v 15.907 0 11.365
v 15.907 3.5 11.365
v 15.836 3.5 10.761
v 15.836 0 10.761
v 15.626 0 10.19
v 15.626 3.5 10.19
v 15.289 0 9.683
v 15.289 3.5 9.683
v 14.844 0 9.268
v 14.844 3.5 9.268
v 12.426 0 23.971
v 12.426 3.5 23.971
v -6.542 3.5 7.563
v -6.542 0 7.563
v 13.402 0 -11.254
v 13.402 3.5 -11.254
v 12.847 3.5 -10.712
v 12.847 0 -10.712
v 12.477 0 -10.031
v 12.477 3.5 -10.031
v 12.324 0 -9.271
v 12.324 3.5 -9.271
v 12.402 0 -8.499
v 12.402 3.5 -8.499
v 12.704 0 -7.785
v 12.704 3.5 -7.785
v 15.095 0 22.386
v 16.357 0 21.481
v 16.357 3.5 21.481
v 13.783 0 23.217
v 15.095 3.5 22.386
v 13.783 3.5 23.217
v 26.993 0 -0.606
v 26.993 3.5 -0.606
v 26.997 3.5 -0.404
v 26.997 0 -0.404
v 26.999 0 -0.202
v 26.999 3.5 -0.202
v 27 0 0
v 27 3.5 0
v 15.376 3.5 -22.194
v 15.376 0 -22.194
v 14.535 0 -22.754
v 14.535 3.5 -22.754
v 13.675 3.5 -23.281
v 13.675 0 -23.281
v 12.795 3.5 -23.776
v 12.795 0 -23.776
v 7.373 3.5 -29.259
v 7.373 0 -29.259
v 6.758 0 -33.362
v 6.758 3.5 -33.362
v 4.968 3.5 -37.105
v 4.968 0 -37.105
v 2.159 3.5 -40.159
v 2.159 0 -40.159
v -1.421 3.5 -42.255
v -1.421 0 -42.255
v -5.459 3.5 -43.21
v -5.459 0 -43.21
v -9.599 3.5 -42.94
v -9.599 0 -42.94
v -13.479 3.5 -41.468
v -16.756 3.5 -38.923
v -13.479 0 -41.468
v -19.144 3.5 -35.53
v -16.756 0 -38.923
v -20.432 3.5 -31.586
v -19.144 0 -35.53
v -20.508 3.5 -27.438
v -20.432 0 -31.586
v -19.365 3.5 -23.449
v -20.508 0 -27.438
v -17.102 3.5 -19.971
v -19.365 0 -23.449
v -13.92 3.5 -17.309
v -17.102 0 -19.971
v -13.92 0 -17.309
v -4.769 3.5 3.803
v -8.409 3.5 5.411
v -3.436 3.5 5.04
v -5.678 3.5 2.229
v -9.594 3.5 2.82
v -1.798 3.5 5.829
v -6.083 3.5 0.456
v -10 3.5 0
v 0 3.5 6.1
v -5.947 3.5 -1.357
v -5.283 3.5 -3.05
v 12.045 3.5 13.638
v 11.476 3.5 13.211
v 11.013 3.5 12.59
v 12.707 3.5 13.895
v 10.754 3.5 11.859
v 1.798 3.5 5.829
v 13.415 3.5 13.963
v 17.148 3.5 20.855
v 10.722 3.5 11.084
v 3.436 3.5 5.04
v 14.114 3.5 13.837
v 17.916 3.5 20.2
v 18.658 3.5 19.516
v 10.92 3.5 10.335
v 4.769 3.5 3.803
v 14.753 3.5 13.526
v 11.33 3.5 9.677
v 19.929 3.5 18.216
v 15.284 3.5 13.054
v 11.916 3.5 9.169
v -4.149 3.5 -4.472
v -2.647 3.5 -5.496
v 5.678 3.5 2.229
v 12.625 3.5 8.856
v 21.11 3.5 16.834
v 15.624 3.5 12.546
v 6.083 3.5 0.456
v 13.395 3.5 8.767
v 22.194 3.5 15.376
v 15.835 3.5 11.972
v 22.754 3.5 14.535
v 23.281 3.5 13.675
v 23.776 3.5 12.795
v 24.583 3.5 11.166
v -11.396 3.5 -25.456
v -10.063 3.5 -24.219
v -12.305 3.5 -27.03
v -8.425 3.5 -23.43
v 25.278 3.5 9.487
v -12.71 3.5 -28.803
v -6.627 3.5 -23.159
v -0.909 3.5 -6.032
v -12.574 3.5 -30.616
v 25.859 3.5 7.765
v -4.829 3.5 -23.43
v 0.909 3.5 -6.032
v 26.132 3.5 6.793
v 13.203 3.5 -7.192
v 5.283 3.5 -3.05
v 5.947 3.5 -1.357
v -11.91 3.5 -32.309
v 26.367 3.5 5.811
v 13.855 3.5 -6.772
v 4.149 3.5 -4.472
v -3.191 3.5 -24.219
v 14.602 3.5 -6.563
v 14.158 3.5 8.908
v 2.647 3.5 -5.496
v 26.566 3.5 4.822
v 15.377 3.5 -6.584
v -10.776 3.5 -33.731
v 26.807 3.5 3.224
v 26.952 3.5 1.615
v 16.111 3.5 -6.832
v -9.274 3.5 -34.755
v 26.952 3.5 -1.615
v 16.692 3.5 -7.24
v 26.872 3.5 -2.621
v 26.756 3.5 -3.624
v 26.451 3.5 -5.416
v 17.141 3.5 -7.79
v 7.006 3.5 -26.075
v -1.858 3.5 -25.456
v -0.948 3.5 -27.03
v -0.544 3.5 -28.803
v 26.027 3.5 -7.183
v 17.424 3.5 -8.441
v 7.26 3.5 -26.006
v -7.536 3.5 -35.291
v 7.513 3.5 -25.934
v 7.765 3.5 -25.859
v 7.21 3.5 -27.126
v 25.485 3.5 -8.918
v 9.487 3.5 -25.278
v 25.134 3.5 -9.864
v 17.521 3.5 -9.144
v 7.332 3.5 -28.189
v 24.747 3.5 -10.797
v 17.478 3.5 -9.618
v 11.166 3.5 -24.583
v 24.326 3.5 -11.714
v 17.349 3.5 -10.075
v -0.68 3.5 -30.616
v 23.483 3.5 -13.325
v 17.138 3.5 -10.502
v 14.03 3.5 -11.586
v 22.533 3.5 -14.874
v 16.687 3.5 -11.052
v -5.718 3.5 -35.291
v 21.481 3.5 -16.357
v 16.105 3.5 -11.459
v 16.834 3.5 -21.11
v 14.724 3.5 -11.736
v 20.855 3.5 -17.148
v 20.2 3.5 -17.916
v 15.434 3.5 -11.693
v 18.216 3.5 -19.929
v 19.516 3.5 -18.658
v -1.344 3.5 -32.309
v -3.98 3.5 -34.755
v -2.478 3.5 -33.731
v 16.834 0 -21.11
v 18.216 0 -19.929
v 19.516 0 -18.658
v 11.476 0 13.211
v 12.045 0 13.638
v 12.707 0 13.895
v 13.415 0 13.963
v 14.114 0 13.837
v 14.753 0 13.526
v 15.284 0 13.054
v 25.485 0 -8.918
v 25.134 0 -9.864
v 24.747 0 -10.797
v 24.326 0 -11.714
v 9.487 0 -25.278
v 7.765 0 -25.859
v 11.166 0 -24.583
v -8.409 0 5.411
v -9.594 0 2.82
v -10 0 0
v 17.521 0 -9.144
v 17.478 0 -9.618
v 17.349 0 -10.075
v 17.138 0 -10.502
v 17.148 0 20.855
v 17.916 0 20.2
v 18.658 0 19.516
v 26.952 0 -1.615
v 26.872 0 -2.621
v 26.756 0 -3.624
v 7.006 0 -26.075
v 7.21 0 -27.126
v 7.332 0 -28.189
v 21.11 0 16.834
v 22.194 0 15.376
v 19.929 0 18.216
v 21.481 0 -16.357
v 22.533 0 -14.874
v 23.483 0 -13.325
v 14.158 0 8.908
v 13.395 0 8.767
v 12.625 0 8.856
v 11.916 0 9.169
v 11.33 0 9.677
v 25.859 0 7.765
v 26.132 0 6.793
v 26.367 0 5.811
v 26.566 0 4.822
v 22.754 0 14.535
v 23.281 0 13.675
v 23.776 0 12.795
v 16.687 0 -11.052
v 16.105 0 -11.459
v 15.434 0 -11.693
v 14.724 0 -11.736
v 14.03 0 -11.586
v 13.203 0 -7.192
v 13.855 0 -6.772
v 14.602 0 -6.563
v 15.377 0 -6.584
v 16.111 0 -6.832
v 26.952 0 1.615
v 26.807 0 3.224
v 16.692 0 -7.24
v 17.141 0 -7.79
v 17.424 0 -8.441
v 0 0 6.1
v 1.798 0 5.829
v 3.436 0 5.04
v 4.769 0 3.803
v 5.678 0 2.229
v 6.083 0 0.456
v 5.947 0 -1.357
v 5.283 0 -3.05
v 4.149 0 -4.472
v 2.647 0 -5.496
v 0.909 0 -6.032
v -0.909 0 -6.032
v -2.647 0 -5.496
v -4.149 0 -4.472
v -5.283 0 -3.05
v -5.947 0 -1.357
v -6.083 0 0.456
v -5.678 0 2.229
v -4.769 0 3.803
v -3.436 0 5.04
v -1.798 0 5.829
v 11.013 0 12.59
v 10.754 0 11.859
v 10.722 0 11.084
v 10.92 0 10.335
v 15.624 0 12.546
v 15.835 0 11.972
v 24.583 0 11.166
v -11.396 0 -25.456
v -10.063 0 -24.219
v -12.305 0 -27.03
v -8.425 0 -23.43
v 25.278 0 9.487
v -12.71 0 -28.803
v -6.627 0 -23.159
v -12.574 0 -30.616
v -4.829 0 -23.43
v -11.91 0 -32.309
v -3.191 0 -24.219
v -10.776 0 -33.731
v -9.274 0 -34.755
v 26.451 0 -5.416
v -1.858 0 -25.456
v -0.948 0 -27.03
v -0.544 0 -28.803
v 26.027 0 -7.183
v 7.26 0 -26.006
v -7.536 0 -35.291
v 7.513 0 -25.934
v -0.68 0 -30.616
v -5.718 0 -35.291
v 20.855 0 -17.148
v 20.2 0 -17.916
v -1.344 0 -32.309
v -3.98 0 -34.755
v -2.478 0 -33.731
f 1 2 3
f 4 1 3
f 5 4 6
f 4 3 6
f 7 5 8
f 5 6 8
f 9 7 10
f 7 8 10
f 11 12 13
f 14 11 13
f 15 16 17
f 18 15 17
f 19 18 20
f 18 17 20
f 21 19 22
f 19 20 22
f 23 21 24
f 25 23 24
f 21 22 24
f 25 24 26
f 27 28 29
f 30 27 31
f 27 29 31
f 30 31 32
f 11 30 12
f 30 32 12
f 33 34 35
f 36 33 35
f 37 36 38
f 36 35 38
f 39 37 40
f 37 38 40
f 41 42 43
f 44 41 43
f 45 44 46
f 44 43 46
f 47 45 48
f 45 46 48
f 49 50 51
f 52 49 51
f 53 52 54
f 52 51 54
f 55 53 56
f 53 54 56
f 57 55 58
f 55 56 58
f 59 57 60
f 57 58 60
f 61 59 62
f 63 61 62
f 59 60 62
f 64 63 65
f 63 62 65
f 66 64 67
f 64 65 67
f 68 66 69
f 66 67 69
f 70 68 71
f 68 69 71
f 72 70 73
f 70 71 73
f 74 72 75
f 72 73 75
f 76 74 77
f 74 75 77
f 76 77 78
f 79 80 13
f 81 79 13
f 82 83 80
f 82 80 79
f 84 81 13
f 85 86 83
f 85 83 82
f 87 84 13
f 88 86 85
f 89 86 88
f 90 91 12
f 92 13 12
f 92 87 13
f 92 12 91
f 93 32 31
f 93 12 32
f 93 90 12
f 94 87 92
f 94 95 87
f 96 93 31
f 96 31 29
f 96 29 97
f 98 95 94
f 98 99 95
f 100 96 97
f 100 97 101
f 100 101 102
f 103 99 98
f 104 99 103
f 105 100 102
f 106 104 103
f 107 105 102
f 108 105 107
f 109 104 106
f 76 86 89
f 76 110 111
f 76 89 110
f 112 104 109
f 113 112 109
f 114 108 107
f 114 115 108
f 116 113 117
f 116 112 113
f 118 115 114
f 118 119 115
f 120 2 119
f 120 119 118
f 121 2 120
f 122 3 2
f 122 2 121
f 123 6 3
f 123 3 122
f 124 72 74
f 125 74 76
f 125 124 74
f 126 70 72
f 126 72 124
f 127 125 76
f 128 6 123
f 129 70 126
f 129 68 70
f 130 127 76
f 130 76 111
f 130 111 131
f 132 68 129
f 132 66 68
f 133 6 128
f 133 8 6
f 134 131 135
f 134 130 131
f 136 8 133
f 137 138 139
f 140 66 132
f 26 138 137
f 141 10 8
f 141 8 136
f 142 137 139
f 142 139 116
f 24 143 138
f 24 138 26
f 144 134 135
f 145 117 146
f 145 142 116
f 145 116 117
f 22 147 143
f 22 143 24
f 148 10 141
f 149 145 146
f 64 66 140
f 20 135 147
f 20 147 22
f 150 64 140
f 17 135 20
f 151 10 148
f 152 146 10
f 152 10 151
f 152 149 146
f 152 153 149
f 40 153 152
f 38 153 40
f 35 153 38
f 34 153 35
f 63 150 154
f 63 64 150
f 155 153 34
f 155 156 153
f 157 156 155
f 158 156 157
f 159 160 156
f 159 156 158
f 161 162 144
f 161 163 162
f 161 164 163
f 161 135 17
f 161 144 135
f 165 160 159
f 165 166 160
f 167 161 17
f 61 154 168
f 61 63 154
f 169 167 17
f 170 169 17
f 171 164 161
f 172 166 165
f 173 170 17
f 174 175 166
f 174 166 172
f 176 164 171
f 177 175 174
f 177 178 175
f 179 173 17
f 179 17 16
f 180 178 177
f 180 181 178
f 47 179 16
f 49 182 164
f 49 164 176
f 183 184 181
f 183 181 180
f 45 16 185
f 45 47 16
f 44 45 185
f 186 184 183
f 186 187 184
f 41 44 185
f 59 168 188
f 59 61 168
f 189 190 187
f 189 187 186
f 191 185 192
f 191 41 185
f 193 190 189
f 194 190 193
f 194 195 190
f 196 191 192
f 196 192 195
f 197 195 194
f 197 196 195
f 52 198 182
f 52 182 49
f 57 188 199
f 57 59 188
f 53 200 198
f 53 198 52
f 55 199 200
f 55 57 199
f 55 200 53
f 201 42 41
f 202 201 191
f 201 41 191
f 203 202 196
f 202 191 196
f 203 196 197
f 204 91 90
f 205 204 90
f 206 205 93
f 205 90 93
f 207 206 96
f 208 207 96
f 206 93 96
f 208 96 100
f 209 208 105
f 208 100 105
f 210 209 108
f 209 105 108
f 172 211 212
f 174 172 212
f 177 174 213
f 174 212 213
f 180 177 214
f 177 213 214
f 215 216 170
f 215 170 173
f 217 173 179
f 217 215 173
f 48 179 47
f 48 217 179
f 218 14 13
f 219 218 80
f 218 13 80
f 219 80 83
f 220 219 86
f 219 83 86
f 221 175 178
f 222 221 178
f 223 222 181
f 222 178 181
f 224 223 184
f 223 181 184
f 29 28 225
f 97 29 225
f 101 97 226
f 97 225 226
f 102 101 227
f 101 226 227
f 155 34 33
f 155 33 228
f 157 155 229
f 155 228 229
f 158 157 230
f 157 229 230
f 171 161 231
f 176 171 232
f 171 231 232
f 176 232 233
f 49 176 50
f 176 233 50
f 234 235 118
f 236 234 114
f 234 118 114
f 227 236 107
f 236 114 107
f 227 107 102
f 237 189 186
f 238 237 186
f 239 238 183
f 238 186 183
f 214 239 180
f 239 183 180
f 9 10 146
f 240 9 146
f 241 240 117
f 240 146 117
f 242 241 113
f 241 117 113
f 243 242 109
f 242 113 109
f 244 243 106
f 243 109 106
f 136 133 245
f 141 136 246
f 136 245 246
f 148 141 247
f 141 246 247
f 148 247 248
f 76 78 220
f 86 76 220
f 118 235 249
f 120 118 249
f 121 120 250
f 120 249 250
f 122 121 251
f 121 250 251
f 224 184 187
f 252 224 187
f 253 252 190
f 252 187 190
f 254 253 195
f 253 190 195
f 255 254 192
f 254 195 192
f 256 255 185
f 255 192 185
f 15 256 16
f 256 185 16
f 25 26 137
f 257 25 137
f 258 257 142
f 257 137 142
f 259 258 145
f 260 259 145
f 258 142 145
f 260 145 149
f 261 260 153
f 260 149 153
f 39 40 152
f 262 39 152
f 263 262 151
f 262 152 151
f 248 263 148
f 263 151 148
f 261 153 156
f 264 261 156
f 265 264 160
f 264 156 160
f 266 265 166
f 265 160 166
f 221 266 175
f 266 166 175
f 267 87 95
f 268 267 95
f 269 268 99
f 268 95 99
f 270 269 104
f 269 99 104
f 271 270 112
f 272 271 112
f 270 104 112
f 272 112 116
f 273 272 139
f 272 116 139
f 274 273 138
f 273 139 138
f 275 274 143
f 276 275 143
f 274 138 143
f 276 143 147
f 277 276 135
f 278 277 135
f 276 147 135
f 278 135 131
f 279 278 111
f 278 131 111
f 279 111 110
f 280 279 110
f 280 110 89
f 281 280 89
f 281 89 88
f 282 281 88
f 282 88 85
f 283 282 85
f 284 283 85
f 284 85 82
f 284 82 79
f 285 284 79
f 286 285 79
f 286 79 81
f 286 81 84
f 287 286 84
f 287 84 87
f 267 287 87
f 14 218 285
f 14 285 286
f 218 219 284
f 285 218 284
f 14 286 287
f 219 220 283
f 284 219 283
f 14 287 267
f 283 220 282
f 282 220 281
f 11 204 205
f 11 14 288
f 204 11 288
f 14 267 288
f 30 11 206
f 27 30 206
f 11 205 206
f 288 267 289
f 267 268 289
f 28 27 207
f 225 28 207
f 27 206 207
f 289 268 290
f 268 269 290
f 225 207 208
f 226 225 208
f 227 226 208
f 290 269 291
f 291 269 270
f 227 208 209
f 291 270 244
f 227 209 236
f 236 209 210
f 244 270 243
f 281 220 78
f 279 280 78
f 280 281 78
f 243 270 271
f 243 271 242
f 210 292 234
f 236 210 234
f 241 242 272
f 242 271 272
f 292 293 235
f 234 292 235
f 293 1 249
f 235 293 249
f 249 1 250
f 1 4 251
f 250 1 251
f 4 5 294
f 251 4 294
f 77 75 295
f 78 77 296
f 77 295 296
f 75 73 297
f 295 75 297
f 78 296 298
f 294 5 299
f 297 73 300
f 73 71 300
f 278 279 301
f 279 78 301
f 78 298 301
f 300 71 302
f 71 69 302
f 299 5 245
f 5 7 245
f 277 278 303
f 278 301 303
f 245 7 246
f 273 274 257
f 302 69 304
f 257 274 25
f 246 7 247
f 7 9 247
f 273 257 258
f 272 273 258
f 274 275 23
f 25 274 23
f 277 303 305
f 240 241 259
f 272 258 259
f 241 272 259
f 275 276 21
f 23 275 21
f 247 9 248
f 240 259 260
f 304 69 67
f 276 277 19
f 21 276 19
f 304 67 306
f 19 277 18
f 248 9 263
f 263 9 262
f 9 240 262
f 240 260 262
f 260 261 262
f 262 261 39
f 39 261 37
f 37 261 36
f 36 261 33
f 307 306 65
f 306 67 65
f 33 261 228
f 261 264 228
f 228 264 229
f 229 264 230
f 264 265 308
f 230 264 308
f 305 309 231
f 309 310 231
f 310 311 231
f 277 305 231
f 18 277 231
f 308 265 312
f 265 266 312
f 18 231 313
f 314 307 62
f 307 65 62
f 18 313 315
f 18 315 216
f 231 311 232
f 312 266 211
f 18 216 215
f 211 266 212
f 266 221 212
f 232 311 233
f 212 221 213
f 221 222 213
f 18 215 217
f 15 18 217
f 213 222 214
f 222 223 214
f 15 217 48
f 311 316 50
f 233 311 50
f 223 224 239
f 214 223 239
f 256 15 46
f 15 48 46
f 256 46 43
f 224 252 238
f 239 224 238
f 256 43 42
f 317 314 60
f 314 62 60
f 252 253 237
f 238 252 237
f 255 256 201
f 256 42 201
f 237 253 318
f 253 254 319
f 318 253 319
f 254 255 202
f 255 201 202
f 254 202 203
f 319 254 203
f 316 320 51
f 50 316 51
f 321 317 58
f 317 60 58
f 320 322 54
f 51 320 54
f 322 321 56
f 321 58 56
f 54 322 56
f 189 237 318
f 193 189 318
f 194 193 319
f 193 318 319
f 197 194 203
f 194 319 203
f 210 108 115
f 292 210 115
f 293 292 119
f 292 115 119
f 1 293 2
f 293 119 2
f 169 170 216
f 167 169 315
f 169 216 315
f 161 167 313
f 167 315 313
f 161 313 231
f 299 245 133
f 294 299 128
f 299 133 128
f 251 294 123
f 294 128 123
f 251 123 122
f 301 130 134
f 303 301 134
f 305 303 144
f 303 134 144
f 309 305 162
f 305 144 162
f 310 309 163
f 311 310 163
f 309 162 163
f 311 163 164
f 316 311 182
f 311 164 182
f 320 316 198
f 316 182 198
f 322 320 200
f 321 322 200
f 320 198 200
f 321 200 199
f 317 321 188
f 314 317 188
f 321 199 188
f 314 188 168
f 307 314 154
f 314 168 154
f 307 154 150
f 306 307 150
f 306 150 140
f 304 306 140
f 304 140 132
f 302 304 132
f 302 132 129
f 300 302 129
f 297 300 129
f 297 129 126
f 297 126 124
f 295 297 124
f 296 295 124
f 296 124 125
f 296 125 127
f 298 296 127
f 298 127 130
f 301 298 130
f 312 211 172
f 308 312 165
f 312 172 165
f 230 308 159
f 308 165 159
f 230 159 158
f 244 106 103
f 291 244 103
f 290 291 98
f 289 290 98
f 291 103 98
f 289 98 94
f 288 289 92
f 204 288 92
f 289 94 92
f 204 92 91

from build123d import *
from build123d.topology import SkipClean

# Parameters (mm, degrees)
SKETCH_1_R           = 27
EXTRUDE_2_DEPTH      = 10
EXTRUDE_START        = -10
EXTRUDE_3_DEPTH      = 10
CUT_EXTRUDE_2_DEPTH  = 48.669538272
SKETCH_6_R           = 6.1
CUT_EXTRUDE_3_DEPTH  = 10
EXTRUDE_5_DEPTH      = 10
SKETCH_10_R          = 6.1
CUT_EXTRUDE_5_DEPTH  = 10
CUT_EXTRUDE_START    = -10
CUT_EXTRUDE_6_DEPTH  = 10
FILLET_1_R           = 10
EXTRUDE_7_DEPTH      = 10
CUT_EXTRUDE_START_2  = -6.5
CUT_EXTRUDE_8_DEPTH  = 6.5
CUT_EXTRUDE_9_DEPTH  = 10
CUT_EXTRUDE_10_DEPTH = 10
CUT_EXTRUDE_11_DEPTH = 55.495669072


with BuildPart() as part:
    # 草图1 → 凸台-拉伸2 (new body)
    with BuildSketch(Plane(origin=(0, 0, 0), x_dir=(1, 0, 0), z_dir=(0, 1, 0))):
        with Locations(Location((0, 0, 0), (0, 0, 270))):
            Circle(SKETCH_1_R)
    extrude(amount=EXTRUDE_2_DEPTH)

    # 草图3 → 凸台-拉伸3 (add)
    with BuildSketch(Plane(origin=(0, 10, 0), x_dir=(1, 0, 0), z_dir=(0, 1, 0)).offset(EXTRUDE_START)):
        with BuildLine():
            ThreePointArc((-3.623654542, 26.755730746), (-4.775668185, 29.776890365), (-6.810627033, 32.289554959))
            ThreePointArc((-6.810627033, 32.289554959), (-7.703697007, 32.088207373), (-8.590838072, 31.862164101))
            ThreePointArc((-8.590838072, 31.862164101), (-9.263273827, 28.699511571), (-8.918147734, 25.484635391))
            ThreePointArc((-8.918147734, 25.484635391), (-6.303024824, 26.253987851), (-3.623654542, 26.755730746))
        make_face()
        with BuildLine():
            ThreePointArc((-11.714275763, 24.326441239), (-13.743495509, 26.843742988), (-16.455312443, 28.604592156))
            ThreePointArc((-16.455312443, 28.604592156), (-17.242452636, 28.137125424), (-18.016322714, 27.648003832))
            ThreePointArc((-18.016322714, 27.648003832), (-17.678533741, 24.432348458), (-16.356847947, 21.481469346))
            ThreePointArc((-16.356847947, 21.481469346), (-14.107461247, 23.021284438), (-11.714275763, 24.326441239))
        make_face()
        with BuildLine():
            ThreePointArc((-18.658222053, 19.515910171), (-21.366013737, 21.282943016), (-24.48923722, 22.119612574))
            ThreePointArc((-24.48923722, 22.119612574), (-25.093396865, 21.431785595), (-25.678244161, 20.727464312))
            ThreePointArc((-25.678244161, 20.727464312), (-24.363295599, 17.773576848), (-22.194425918, 15.375547411))
            ThreePointArc((-22.194425918, 15.375547411), (-20.530961071, 17.535097305), (-18.658222053, 19.515910171))
        make_face()
        with BuildLine():
            ThreePointArc((-23.77577157, 12.79502584), (-26.897077674, 13.638820294), (-30.125984831, 13.469411196))
            ThreePointArc((-30.125984831, 13.469411196), (-30.488024573, 12.628553268), (-30.826600159, 11.777976169))
            ThreePointArc((-30.826600159, 11.777976169), (-28.663208335, 9.3750037), (-25.859458842, 7.764559768))
            ThreePointArc((-25.859458842, 7.764559768), (-24.944747378, 10.332452674), (-23.77577157, 12.79502584))
        make_face()
        with BuildLine():
            ThreePointArc((-26.56598291, 4.821675232), (-29.795268245, 4.659634815), (-32.813791147, 3.500730003))
            ThreePointArc((-32.813791147, 3.500730003), (-32.898272013, 2.589150159), (-32.957433752, 1.675577656))
            ThreePointArc((-32.957433752, 1.675577656), (-30.15736653, 0.05873987), (-26.993187762, -0.606477084))
            ThreePointArc((-26.993187762, -0.606477084), (-26.916768011, 2.118395585), (-26.56598291, 4.821675232))
        make_face()
        with BuildLine():
            ThreePointArc((-32.289554959, -6.810627033), (-32.088207373, -7.703697007), (-31.862164101, -8.590838072))
            ThreePointArc((-31.862164101, -8.590838072), (-28.699511571, -9.263273827), (-25.484635391, -8.918147734))
            ThreePointArc((-25.484635391, -8.918147734), (-26.253987851, -6.303024824), (-26.755730746, -3.623654542))
            ThreePointArc((-26.755730746, -3.623654542), (-29.776890365, -4.775668185), (-32.289554959, -6.810627033))
        make_face()
        with BuildLine():
            ThreePointArc((-28.604592156, -16.455312443), (-28.137125424, -17.242452636), (-27.648003832, -18.016322714))
            ThreePointArc((-27.648003832, -18.016322714), (-24.432348458, -17.678533741), (-21.481469346, -16.356847947))
            ThreePointArc((-21.481469346, -16.356847947), (-23.021284438, -14.107461247), (-24.326441239, -11.714275763))
            ThreePointArc((-24.326441239, -11.714275763), (-26.843742988, -13.743495509), (-28.604592156, -16.455312443))
        make_face()
        with BuildLine():
            ThreePointArc((-22.119612574, -24.48923722), (-21.431785595, -25.093396865), (-20.727464312, -25.678244161))
            ThreePointArc((-20.727464312, -25.678244161), (-17.773576848, -24.363295599), (-15.375547411, -22.194425918))
            ThreePointArc((-15.375547411, -22.194425918), (-17.535097305, -20.530961071), (-19.515910171, -18.658222053))
            ThreePointArc((-19.515910171, -18.658222053), (-21.282943016, -21.366013737), (-22.119612574, -24.48923722))
        make_face()
        with BuildLine():
            ThreePointArc((-13.469411196, -30.125984831), (-12.628553268, -30.488024573), (-11.777976169, -30.826600159))
            ThreePointArc((-11.777976169, -30.826600159), (-9.3750037, -28.663208335), (-7.764559768, -25.859458842))
            ThreePointArc((-7.764559768, -25.859458842), (-10.332452674, -24.944747378), (-12.79502584, -23.77577157))
            ThreePointArc((-12.79502584, -23.77577157), (-13.638820294, -26.897077674), (-13.469411196, -30.125984831))
        make_face()
        with BuildLine():
            ThreePointArc((-3.500730003, -32.813791147), (-2.589150159, -32.898272013), (-1.675577656, -32.957433752))
            ThreePointArc((-1.675577656, -32.957433752), (-0.05873987, -30.15736653), (0.606477084, -26.993187762))
            ThreePointArc((0.606477084, -26.993187762), (-2.118395585, -26.916768011), (-4.821675232, -26.56598291))
            ThreePointArc((-4.821675232, -26.56598291), (-4.659634815, -29.795268245), (-3.500730003, -32.813791147))
        make_face()
        with BuildLine():
            ThreePointArc((6.810627033, -32.289554959), (7.703697007, -32.088207373), (8.590838072, -31.862164101))
            ThreePointArc((8.590838072, -31.862164101), (9.263273827, -28.699511571), (8.918147734, -25.484635391))
            ThreePointArc((8.918147734, -25.484635391), (6.303024824, -26.253987851), (3.623654542, -26.755730746))
            ThreePointArc((3.623654542, -26.755730746), (4.775668185, -29.776890365), (6.810627033, -32.289554959))
        make_face()
        with BuildLine():
            ThreePointArc((16.455312443, -28.604592156), (17.242452636, -28.137125424), (18.016322714, -27.648003832))
            ThreePointArc((18.016322714, -27.648003832), (17.678533741, -24.432348458), (16.356847947, -21.481469346))
            ThreePointArc((16.356847947, -21.481469346), (14.107461247, -23.021284438), (11.714275763, -24.326441239))
            ThreePointArc((11.714275763, -24.326441239), (13.743495509, -26.843742988), (16.455312443, -28.604592156))
        make_face()
        with BuildLine():
            ThreePointArc((24.48923722, -22.119612574), (25.093396865, -21.431785595), (25.678244161, -20.727464312))
            ThreePointArc((25.678244161, -20.727464312), (24.363295599, -17.773576848), (22.194425918, -15.375547411))
            ThreePointArc((22.194425918, -15.375547411), (20.530961071, -17.535097305), (18.658222053, -19.515910171))
            ThreePointArc((18.658222053, -19.515910171), (21.366013737, -21.282943016), (24.48923722, -22.119612574))
        make_face()
        with BuildLine():
            ThreePointArc((30.125984831, -13.469411196), (30.488024573, -12.628553268), (30.826600159, -11.777976169))
            ThreePointArc((30.826600159, -11.777976169), (28.663208335, -9.3750037), (25.859458842, -7.764559768))
            ThreePointArc((25.859458842, -7.764559768), (24.944747378, -10.332452674), (23.77577157, -12.79502584))
            ThreePointArc((23.77577157, -12.79502584), (26.897077674, -13.638820294), (30.125984831, -13.469411196))
        make_face()
        with BuildLine():
            ThreePointArc((32.813791147, -3.500730003), (32.898272013, -2.589150159), (32.957433752, -1.675577656))
            ThreePointArc((32.957433752, -1.675577656), (30.15736653, -0.05873987), (26.993187762, 0.606477084))
            ThreePointArc((26.993187762, 0.606477084), (26.998296887, 0.303257671), (27, 0))
            ThreePointArc((27, 0), (26.891276825, -2.420584789), (26.56598291, -4.821675232))
            ThreePointArc((26.56598291, -4.821675232), (29.795268245, -4.659634815), (32.813791147, -3.500730003))
        make_face()
        with BuildLine():
            ThreePointArc((26.755730746, 3.623654542), (29.776890365, 4.775668185), (32.289554959, 6.810627033))
            ThreePointArc((32.289554959, 6.810627033), (32.088207373, 7.703697007), (31.862164101, 8.590838072))
            ThreePointArc((31.862164101, 8.590838072), (28.699511571, 9.263273827), (25.484635391, 8.918147734))
            ThreePointArc((25.484635391, 8.918147734), (26.253987851, 6.303024824), (26.755730746, 3.623654542))
        make_face()
        with BuildLine():
            ThreePointArc((24.326441239, 11.714275763), (26.843742988, 13.743495509), (28.604592156, 16.455312443))
            ThreePointArc((28.604592156, 16.455312443), (28.137125424, 17.242452636), (27.648003832, 18.016322714))
            ThreePointArc((27.648003832, 18.016322714), (24.432348458, 17.678533741), (21.481469346, 16.356847947))
            ThreePointArc((21.481469346, 16.356847947), (23.021284438, 14.107461247), (24.326441239, 11.714275763))
        make_face()
        with BuildLine():
            ThreePointArc((19.515910171, 18.658222053), (21.282943016, 21.366013737), (22.119612574, 24.48923722))
            ThreePointArc((22.119612574, 24.48923722), (21.431785595, 25.093396865), (20.727464312, 25.678244161))
            ThreePointArc((20.727464312, 25.678244161), (17.773576848, 24.363295599), (15.375547411, 22.194425918))
            ThreePointArc((15.375547411, 22.194425918), (17.535097305, 20.530961071), (19.515910171, 18.658222053))
        make_face()
        with BuildLine():
            ThreePointArc((12.79502584, 23.77577157), (13.638820294, 26.897077674), (13.469411196, 30.125984831))
            ThreePointArc((13.469411196, 30.125984831), (12.628553268, 30.488024573), (11.777976169, 30.826600159))
            ThreePointArc((11.777976169, 30.826600159), (9.3750037, 28.663208335), (7.764559768, 25.859458842))
            ThreePointArc((7.764559768, 25.859458842), (10.332452674, 24.944747378), (12.79502584, 23.77577157))
        make_face()
        with BuildLine():
            ThreePointArc((4.821675232, 26.56598291), (4.659634815, 29.795268245), (3.500730003, 32.813791147))
            ThreePointArc((3.500730003, 32.813791147), (2.589150159, 32.898272013), (1.675577656, 32.957433752))
            ThreePointArc((1.675577656, 32.957433752), (0.05873987, 30.15736653), (-0.606477084, 26.993187762))
            ThreePointArc((-0.606477084, 26.993187762), (2.118395585, 26.916768011), (4.821675232, 26.56598291))
        make_face()
    extrude(amount=EXTRUDE_3_DEPTH)

    # 草图4 → 切除-拉伸2 (cut, through all)
    with BuildSketch(Plane(origin=(0, 10, 0), x_dir=(1, 0, 0), z_dir=(0, 1, 0))):
        with BuildLine():
            Line((68.70942434, -72.656830422), (-6.542169106, -7.563069707))
            ThreePointArc((-6.542169106, -7.563069707), (-9.614988938, -2.748088014), (-9.550796477, 2.963492306))
            Line((-9.550796477, 2.963492306), (-2.118395585, 26.916768011))
            Line((-2.118395585, 26.916768011), (19.935579671, 97.992717399))
            ThreePointArc((19.935579671, 97.992717399), (-96.149889375, -27.480880138), (68.70942434, -72.656830422))
        make_face()
    extrude(amount=-CUT_EXTRUDE_2_DEPTH, mode=Mode.SUBTRACT)

    # 草图6 → 切除-拉伸3 (cut)
    with BuildSketch(Plane(origin=(0, 10, 0), x_dir=(1, 0, 0), z_dir=(0, 1, 0))):
        with Locations(Location((0, 0, 0), (0, 0, 270))):
            Circle(SKETCH_6_R)
    extrude(amount=-CUT_EXTRUDE_3_DEPTH, mode=Mode.SUBTRACT)

    # 草图9 → 凸台-拉伸5 (add)
    with BuildSketch(Plane(origin=(0, 10, 0), x_dir=(1, 0, 0), z_dir=(0, 1, 0)).offset(EXTRUDE_START)):
        with BuildLine():
            Line((-18.337271569, 36.810995995), (-10, 0))
            ThreePointArc((-10, 0), (-9.887061363, 1.49867195), (-9.550796477, 2.963492306))
            Line((-9.550796477, 2.963492306), (-2.118395585, 26.916768011))
            ThreePointArc((-2.118395585, 26.916768011), (-1.362972032, 26.965576338), (-0.606477084, 26.993187762))
            ThreePointArc((-0.606477084, 26.993187762), (0.05873987, 30.15736653), (1.675577656, 32.957433752))
            ThreePointArc((1.675577656, 32.957433752), (2.589150159, 32.898272013), (3.500730003, 32.813791147))
            ThreePointArc((3.500730003, 32.813791147), (4.659634815, 29.795268245), (4.821675232, 26.56598291))
            Line((4.821675232, 26.56598291), (7.168022985, 33.612773021))
            ThreePointArc((7.168022985, 33.612773021), (-5.303969741, 37.450057719), (-18.337271569, 36.810995995))
        make_face()
    extrude(amount=EXTRUDE_5_DEPTH)

    # 草图10 → 切除-拉伸5 (cut)
    with BuildSketch(Plane(origin=(0, 10, 0), x_dir=(1, 0, 0), z_dir=(0, 1, 0))):
        with Locations(Location((-6.626815852, 29.258935587, 0), (0, 0, 270))):
            Circle(SKETCH_10_R)
    extrude(amount=-CUT_EXTRUDE_5_DEPTH, mode=Mode.SUBTRACT)

    # 草图11 → 切除-拉伸6 (cut)
    with BuildSketch(Plane(origin=(0, 10, 0), x_dir=(1, 0, 0), z_dir=(0, 1, 0)).offset(CUT_EXTRUDE_START)):
        with BuildLine():
            Line((0, 36.394498532), (3.500730003, 32.813791147))
            ThreePointArc((3.500730003, 32.813791147), (4.659634815, 29.795268245), (4.821675232, 26.56598291))
            Line((4.821675232, 26.56598291), (7.168022985, 33.612773021))
            ThreePointArc((7.168022985, 33.612773021), (3.655030847, 35.186640305), (0, 36.394498532))
        make_face()
    extrude(amount=CUT_EXTRUDE_6_DEPTH, mode=Mode.SUBTRACT)

    # 圆角1
    fillet_1_edges = [part.edges().sort_by_distance(p)[0] for p in [
        (-18.337271569, 5, -36.810995995),
    ]]
    fillet(fillet_1_edges, radius=FILLET_1_R)

    # 草图16 → 凸台-拉伸7 (add)
    with BuildSketch(Plane(origin=(0, 10, 0), x_dir=(1, 0, 0), z_dir=(0, 1, 0)).offset(EXTRUDE_START)):
        with BuildLine():
            Line((-13.920244702, 17.308793512), (-15.716384779, 25.239170332))
            ThreePointArc((-15.716384779, 25.239170332), (-13.300434171, 34.242814336), (-4.508428545, 37.341694744))
            ThreePointArc((-4.508428545, 37.341694744), (-2.23974925, 36.936946702), (0, 36.394498532))
            Line((0, 36.394498532), (3.500730003, 32.813791147))
            ThreePointArc((3.500730003, 32.813791147), (4.659634815, 29.795268245), (4.821675232, 26.56598291))
            ThreePointArc((4.821675232, 26.56598291), (5.919103569, 26.343200507), (7.006350229, 26.075104151))
            ThreePointArc((7.006350229, 26.075104151), (7.281173311, 27.65648826), (7.373184148, 29.258935587))
            ThreePointArc((7.373184148, 29.258935587), (-13.478530824, 41.467703008), (-13.920244702, 17.308793512))
        make_face()
    extrude(amount=EXTRUDE_7_DEPTH)

    # 草图17 → 切除-拉伸8 (cut)
    with BuildSketch(Plane(origin=(0, 10, 0), x_dir=(1, 0, 0), z_dir=(0, 1, 0)).offset(CUT_EXTRUDE_START_2)):
        with BuildLine():
            Line((-13.920244702, 17.308793512), (-10, 0))
            ThreePointArc((-10, 0), (-9.09455032, -4.158022904), (-6.542169106, -7.563069707))
            Line((-6.542169106, -7.563069707), (17.242452636, -28.137125424))
            ThreePointArc((17.242452636, -28.137125424), (17.631083908, -27.895248345), (18.016322714, -27.648003832))
            ThreePointArc((18.016322714, -27.648003832), (17.678533741, -24.432348458), (16.356847947, -21.481469346))
            ThreePointArc((16.356847947, -21.481469346), (17.535097305, -20.530961071), (18.658222053, -19.515910171))
            ThreePointArc((18.658222053, -19.515910171), (21.366013737, -21.282943016), (24.48923722, -22.119612574))
            ThreePointArc((24.48923722, -22.119612574), (25.093396865, -21.431785595), (25.678244161, -20.727464312))
            ThreePointArc((25.678244161, -20.727464312), (24.363295599, -17.773576848), (22.194425918, -15.375547411))
            ThreePointArc((22.194425918, -15.375547411), (23.021284438, -14.107461247), (23.77577157, -12.79502584))
            ThreePointArc((23.77577157, -12.79502584), (26.897077674, -13.638820294), (30.125984831, -13.469411196))
            ThreePointArc((30.125984831, -13.469411196), (30.488024573, -12.628553268), (30.826600159, -11.777976169))
            ThreePointArc((30.826600159, -11.777976169), (28.663208335, -9.3750037), (25.859458842, -7.764559768))
            ThreePointArc((25.859458842, -7.764559768), (26.253987851, -6.303024824), (26.56598291, -4.821675232))
            ThreePointArc((26.56598291, -4.821675232), (29.795268245, -4.659634815), (32.813791147, -3.500730003))
            ThreePointArc((32.813791147, -3.500730003), (32.898272013, -2.589150159), (32.957433752, -1.675577656))
            ThreePointArc((32.957433752, -1.675577656), (30.15736653, -0.05873987), (26.993187762, 0.606477084))
            ThreePointArc((26.993187762, 0.606477084), (26.916768011, 2.118395585), (26.755730746, 3.623654542))
            ThreePointArc((26.755730746, 3.623654542), (29.776890365, 4.775668185), (32.289554959, 6.810627033))
            ThreePointArc((32.289554959, 6.810627033), (32.088207373, 7.703697007), (31.862164101, 8.590838072))
            ThreePointArc((31.862164101, 8.590838072), (28.699511571, 9.263273827), (25.484635391, 8.918147734))
            ThreePointArc((25.484635391, 8.918147734), (24.944747378, 10.332452674), (24.326441239, 11.714275763))
            ThreePointArc((24.326441239, 11.714275763), (26.843742988, 13.743495509), (28.604592156, 16.455312443))
            ThreePointArc((28.604592156, 16.455312443), (28.137125424, 17.242452636), (27.648003832, 18.016322714))
            ThreePointArc((27.648003832, 18.016322714), (24.432348458, 17.678533741), (21.481469346, 16.356847947))
            ThreePointArc((21.481469346, 16.356847947), (20.530961071, 17.535097305), (19.515910171, 18.658222053))
            ThreePointArc((19.515910171, 18.658222053), (21.282943016, 21.366013737), (22.119612574, 24.48923722))
            ThreePointArc((22.119612574, 24.48923722), (21.431785595, 25.093396865), (20.727464312, 25.678244161))
            ThreePointArc((20.727464312, 25.678244161), (17.773576848, 24.363295599), (15.375547411, 22.194425918))
            ThreePointArc((15.375547411, 22.194425918), (14.107461247, 23.021284438), (12.79502584, 23.77577157))
            ThreePointArc((12.79502584, 23.77577157), (13.638820294, 26.897077674), (13.469411196, 30.125984831))
            ThreePointArc((13.469411196, 30.125984831), (12.628553268, 30.488024573), (11.777976169, 30.826600159))
            ThreePointArc((11.777976169, 30.826600159), (9.3750037, 28.663208335), (7.764559768, 25.859458842))
            ThreePointArc((7.764559768, 25.859458842), (7.386242025, 25.970048686), (7.006350229, 26.075104151))
            ThreePointArc((7.006350229, 26.075104151), (-12.036078056, 42.171715396), (-13.920244702, 17.308793512))
        make_face()
    extrude(amount=CUT_EXTRUDE_8_DEPTH, mode=Mode.SUBTRACT)

    # 草图19 → 切除-拉伸9 (cut)
    with BuildSketch(Plane(origin=(0, 3.5, 0), x_dir=(1, 0, 0), z_dir=(0, 1, 0))):
        with BuildLine():
            ThreePointArc((17.521202876, 9.143724883), (17.423586491, 9.849470052), (17.138067304, 10.502221151))
            Line((17.138067304, 10.502221151), (14.921202876, 9.143724883))
            ThreePointArc((14.921202876, 9.143724883), (15.559223715, 8.01002855), (16.111264261, 6.832068788))
            ThreePointArc((16.111264261, 6.832068788), (17.140905514, 7.78987105), (17.521202876, 9.143724883))
        make_face()
        with BuildLine():
            Line((14.921202876, 9.143724883), (17.138067304, 10.502221151))
            ThreePointArc((17.138067304, 10.502221151), (15.433773338, 11.692699485), (13.401778777, 11.253547246))
            ThreePointArc((13.401778777, 11.253547246), (14.200727447, 10.226892977), (14.921202876, 9.143724883))
        make_face()
        with BuildLine():
            ThreePointArc((16.111264261, 6.832068788), (15.559223715, 8.01002855), (14.921202876, 9.143724883))
            Line((14.921202876, 9.143724883), (12.704338449, 7.785228614))
            ThreePointArc((12.704338449, 7.785228614), (14.220696248, 6.639869762), (16.111264261, 6.832068788))
        make_face()
        with BuildLine():
            Line((12.704338449, 7.785228614), (14.921202876, 9.143724883))
            ThreePointArc((14.921202876, 9.143724883), (14.200727447, 10.226892977), (13.401778777, 11.253547246))
            ThreePointArc((13.401778777, 11.253547246), (12.372228274, 9.656295344), (12.704338449, 7.785228614))
        make_face()
        with BuildLine():
            ThreePointArc((11.330048887, -9.67677592), (10.709328217, -11.472853236), (11.476337998, -13.211497499))
            ThreePointArc((11.476337998, -13.211497499), (12.426054396, -12.322466156), (13.307104398, -11.365340846))
            Line((13.307104398, -11.365340846), (11.330048887, -9.67677592))
        make_face()
        with BuildLine():
            ThreePointArc((13.307104398, -11.365340846), (12.426054396, -12.322466156), (11.476337998, -13.211497499))
            ThreePointArc((11.476337998, -13.211497499), (13.414616788, -13.963117027), (15.284159909, -13.053905771))
            Line((15.284159909, -13.053905771), (13.307104398, -11.365340846))
        make_face()
        with BuildLine():
            ThreePointArc((14.844136837, -9.268311689), (13.006911405, -8.782728957), (11.330048887, -9.67677592))
            Line((11.330048887, -9.67677592), (13.307104398, -11.365340846))
            ThreePointArc((13.307104398, -11.365340846), (14.114619321, -10.345410645), (14.844136837, -9.268311689))
        make_face()
        with BuildLine():
            ThreePointArc((15.907104398, -11.365340846), (15.626186581, -10.189816354), (14.844136837, -9.268311689))
            ThreePointArc((14.844136837, -9.268311689), (14.114619321, -10.345410645), (13.307104398, -11.365340846))
            Line((13.307104398, -11.365340846), (15.284159909, -13.053905771))
            ThreePointArc((15.284159909, -13.053905771), (15.746401871, -12.265245194), (15.907104398, -11.365340846))
        make_face()
    extrude(amount=-CUT_EXTRUDE_9_DEPTH, mode=Mode.SUBTRACT)

    # 草图20 → 切除-拉伸10 (cut)
    with SkipClean():  # the faces are left unmerged after this step: merging them gives an invalid solid
        with BuildSketch(Plane(origin=(0, 3.5, 0), x_dir=(1, 0, 0), z_dir=(0, 1, 0)).offset(CUT_EXTRUDE_START)):
            with BuildLine():
                ThreePointArc((11.777976169, 30.826600159), (9.3750037, 28.663208335), (7.764559768, 25.859458842))
                ThreePointArc((7.764559768, 25.859458842), (10.332452674, 24.944747378), (12.79502584, 23.77577157))
                ThreePointArc((12.79502584, 23.77577157), (13.638820294, 26.897077674), (13.469411196, 30.125984831))
                ThreePointArc((13.469411196, 30.125984831), (12.628553268, 30.488024573), (11.777976169, 30.826600159))
            make_face()
        extrude(amount=CUT_EXTRUDE_10_DEPTH, mode=Mode.SUBTRACT)

    # 草图22 → 切除-拉伸11 (cut, through all)
    with SkipClean():  # the faces are left unmerged after this step: merging them gives an invalid solid
        with BuildSketch(Plane(origin=(0, 3.5, 0), x_dir=(1, 0, 0), z_dir=(0, 1, 0))):
            with BuildLine():
                ThreePointArc((20.727464312, 25.678244161), (17.773576848, 24.363295599), (15.375547411, 22.194425918))
                ThreePointArc((15.375547411, 22.194425918), (17.535097305, 20.530961071), (19.515910171, 18.658222053))
                ThreePointArc((19.515910171, 18.658222053), (21.282943016, 21.366013737), (22.119612574, 24.48923722))
                ThreePointArc((22.119612574, 24.48923722), (21.431785595, 25.093396865), (20.727464312, 25.678244161))
            make_face()
            with BuildLine():
                ThreePointArc((27.648003832, 18.016322714), (24.432348458, 17.678533741), (21.481469346, 16.356847947))
                ThreePointArc((21.481469346, 16.356847947), (23.021284438, 14.107461247), (24.326441239, 11.714275763))
                ThreePointArc((24.326441239, 11.714275763), (26.843742988, 13.743495509), (28.604592156, 16.455312443))
                ThreePointArc((28.604592156, 16.455312443), (28.137125424, 17.242452636), (27.648003832, 18.016322714))
            make_face()
            with BuildLine():
                ThreePointArc((31.862164101, 8.590838072), (28.699511571, 9.263273827), (25.484635391, 8.918147734))
                ThreePointArc((25.484635391, 8.918147734), (26.253987851, 6.303024824), (26.755730746, 3.623654542))
                ThreePointArc((26.755730746, 3.623654542), (29.776890365, 4.775668185), (32.289554959, 6.810627033))
                ThreePointArc((32.289554959, 6.810627033), (32.088207373, 7.703697007), (31.862164101, 8.590838072))
            make_face()
            with BuildLine():
                ThreePointArc((27, 0), (26.891276825, -2.420584789), (26.56598291, -4.821675232))
                ThreePointArc((26.56598291, -4.821675232), (29.795268245, -4.659634815), (32.813791147, -3.500730003))
                ThreePointArc((32.813791147, -3.500730003), (32.898272013, -2.589150159), (32.957433752, -1.675577656))
                ThreePointArc((32.957433752, -1.675577656), (30.15736653, -0.05873987), (26.993187762, 0.606477084))
                ThreePointArc((26.993187762, 0.606477084), (26.998296887, 0.303257671), (27, 0))
            make_face()
            with BuildLine():
                ThreePointArc((25.859458842, -7.764559768), (24.944747378, -10.332452674), (23.77577157, -12.79502584))
                ThreePointArc((23.77577157, -12.79502584), (26.897077674, -13.638820294), (30.125984831, -13.469411196))
                ThreePointArc((30.125984831, -13.469411196), (30.488024573, -12.628553268), (30.826600159, -11.777976169))
                ThreePointArc((30.826600159, -11.777976169), (28.663208335, -9.3750037), (25.859458842, -7.764559768))
            make_face()
            with BuildLine():
                ThreePointArc((22.194425918, -15.375547411), (20.530961071, -17.535097305), (18.658222053, -19.515910171))
                ThreePointArc((18.658222053, -19.515910171), (21.366013737, -21.282943016), (24.48923722, -22.119612574))
                ThreePointArc((24.48923722, -22.119612574), (25.093396865, -21.431785595), (25.678244161, -20.727464312))
                ThreePointArc((25.678244161, -20.727464312), (24.363295599, -17.773576848), (22.194425918, -15.375547411))
            make_face()
            with BuildLine():
                ThreePointArc((16.356847947, -21.481469346), (14.445101596, -22.810941232), (12.425913221, -23.970746351))
                Line((12.425913221, -23.970746351), (17.242452636, -28.137125424))
                ThreePointArc((17.242452636, -28.137125424), (17.631083908, -27.895248345), (18.016322714, -27.648003832))
                ThreePointArc((18.016322714, -27.648003832), (17.678533741, -24.432348458), (16.356847947, -21.481469346))
            make_face()
        extrude(amount=-CUT_EXTRUDE_11_DEPTH, mode=Mode.SUBTRACT)


solid = part.part
